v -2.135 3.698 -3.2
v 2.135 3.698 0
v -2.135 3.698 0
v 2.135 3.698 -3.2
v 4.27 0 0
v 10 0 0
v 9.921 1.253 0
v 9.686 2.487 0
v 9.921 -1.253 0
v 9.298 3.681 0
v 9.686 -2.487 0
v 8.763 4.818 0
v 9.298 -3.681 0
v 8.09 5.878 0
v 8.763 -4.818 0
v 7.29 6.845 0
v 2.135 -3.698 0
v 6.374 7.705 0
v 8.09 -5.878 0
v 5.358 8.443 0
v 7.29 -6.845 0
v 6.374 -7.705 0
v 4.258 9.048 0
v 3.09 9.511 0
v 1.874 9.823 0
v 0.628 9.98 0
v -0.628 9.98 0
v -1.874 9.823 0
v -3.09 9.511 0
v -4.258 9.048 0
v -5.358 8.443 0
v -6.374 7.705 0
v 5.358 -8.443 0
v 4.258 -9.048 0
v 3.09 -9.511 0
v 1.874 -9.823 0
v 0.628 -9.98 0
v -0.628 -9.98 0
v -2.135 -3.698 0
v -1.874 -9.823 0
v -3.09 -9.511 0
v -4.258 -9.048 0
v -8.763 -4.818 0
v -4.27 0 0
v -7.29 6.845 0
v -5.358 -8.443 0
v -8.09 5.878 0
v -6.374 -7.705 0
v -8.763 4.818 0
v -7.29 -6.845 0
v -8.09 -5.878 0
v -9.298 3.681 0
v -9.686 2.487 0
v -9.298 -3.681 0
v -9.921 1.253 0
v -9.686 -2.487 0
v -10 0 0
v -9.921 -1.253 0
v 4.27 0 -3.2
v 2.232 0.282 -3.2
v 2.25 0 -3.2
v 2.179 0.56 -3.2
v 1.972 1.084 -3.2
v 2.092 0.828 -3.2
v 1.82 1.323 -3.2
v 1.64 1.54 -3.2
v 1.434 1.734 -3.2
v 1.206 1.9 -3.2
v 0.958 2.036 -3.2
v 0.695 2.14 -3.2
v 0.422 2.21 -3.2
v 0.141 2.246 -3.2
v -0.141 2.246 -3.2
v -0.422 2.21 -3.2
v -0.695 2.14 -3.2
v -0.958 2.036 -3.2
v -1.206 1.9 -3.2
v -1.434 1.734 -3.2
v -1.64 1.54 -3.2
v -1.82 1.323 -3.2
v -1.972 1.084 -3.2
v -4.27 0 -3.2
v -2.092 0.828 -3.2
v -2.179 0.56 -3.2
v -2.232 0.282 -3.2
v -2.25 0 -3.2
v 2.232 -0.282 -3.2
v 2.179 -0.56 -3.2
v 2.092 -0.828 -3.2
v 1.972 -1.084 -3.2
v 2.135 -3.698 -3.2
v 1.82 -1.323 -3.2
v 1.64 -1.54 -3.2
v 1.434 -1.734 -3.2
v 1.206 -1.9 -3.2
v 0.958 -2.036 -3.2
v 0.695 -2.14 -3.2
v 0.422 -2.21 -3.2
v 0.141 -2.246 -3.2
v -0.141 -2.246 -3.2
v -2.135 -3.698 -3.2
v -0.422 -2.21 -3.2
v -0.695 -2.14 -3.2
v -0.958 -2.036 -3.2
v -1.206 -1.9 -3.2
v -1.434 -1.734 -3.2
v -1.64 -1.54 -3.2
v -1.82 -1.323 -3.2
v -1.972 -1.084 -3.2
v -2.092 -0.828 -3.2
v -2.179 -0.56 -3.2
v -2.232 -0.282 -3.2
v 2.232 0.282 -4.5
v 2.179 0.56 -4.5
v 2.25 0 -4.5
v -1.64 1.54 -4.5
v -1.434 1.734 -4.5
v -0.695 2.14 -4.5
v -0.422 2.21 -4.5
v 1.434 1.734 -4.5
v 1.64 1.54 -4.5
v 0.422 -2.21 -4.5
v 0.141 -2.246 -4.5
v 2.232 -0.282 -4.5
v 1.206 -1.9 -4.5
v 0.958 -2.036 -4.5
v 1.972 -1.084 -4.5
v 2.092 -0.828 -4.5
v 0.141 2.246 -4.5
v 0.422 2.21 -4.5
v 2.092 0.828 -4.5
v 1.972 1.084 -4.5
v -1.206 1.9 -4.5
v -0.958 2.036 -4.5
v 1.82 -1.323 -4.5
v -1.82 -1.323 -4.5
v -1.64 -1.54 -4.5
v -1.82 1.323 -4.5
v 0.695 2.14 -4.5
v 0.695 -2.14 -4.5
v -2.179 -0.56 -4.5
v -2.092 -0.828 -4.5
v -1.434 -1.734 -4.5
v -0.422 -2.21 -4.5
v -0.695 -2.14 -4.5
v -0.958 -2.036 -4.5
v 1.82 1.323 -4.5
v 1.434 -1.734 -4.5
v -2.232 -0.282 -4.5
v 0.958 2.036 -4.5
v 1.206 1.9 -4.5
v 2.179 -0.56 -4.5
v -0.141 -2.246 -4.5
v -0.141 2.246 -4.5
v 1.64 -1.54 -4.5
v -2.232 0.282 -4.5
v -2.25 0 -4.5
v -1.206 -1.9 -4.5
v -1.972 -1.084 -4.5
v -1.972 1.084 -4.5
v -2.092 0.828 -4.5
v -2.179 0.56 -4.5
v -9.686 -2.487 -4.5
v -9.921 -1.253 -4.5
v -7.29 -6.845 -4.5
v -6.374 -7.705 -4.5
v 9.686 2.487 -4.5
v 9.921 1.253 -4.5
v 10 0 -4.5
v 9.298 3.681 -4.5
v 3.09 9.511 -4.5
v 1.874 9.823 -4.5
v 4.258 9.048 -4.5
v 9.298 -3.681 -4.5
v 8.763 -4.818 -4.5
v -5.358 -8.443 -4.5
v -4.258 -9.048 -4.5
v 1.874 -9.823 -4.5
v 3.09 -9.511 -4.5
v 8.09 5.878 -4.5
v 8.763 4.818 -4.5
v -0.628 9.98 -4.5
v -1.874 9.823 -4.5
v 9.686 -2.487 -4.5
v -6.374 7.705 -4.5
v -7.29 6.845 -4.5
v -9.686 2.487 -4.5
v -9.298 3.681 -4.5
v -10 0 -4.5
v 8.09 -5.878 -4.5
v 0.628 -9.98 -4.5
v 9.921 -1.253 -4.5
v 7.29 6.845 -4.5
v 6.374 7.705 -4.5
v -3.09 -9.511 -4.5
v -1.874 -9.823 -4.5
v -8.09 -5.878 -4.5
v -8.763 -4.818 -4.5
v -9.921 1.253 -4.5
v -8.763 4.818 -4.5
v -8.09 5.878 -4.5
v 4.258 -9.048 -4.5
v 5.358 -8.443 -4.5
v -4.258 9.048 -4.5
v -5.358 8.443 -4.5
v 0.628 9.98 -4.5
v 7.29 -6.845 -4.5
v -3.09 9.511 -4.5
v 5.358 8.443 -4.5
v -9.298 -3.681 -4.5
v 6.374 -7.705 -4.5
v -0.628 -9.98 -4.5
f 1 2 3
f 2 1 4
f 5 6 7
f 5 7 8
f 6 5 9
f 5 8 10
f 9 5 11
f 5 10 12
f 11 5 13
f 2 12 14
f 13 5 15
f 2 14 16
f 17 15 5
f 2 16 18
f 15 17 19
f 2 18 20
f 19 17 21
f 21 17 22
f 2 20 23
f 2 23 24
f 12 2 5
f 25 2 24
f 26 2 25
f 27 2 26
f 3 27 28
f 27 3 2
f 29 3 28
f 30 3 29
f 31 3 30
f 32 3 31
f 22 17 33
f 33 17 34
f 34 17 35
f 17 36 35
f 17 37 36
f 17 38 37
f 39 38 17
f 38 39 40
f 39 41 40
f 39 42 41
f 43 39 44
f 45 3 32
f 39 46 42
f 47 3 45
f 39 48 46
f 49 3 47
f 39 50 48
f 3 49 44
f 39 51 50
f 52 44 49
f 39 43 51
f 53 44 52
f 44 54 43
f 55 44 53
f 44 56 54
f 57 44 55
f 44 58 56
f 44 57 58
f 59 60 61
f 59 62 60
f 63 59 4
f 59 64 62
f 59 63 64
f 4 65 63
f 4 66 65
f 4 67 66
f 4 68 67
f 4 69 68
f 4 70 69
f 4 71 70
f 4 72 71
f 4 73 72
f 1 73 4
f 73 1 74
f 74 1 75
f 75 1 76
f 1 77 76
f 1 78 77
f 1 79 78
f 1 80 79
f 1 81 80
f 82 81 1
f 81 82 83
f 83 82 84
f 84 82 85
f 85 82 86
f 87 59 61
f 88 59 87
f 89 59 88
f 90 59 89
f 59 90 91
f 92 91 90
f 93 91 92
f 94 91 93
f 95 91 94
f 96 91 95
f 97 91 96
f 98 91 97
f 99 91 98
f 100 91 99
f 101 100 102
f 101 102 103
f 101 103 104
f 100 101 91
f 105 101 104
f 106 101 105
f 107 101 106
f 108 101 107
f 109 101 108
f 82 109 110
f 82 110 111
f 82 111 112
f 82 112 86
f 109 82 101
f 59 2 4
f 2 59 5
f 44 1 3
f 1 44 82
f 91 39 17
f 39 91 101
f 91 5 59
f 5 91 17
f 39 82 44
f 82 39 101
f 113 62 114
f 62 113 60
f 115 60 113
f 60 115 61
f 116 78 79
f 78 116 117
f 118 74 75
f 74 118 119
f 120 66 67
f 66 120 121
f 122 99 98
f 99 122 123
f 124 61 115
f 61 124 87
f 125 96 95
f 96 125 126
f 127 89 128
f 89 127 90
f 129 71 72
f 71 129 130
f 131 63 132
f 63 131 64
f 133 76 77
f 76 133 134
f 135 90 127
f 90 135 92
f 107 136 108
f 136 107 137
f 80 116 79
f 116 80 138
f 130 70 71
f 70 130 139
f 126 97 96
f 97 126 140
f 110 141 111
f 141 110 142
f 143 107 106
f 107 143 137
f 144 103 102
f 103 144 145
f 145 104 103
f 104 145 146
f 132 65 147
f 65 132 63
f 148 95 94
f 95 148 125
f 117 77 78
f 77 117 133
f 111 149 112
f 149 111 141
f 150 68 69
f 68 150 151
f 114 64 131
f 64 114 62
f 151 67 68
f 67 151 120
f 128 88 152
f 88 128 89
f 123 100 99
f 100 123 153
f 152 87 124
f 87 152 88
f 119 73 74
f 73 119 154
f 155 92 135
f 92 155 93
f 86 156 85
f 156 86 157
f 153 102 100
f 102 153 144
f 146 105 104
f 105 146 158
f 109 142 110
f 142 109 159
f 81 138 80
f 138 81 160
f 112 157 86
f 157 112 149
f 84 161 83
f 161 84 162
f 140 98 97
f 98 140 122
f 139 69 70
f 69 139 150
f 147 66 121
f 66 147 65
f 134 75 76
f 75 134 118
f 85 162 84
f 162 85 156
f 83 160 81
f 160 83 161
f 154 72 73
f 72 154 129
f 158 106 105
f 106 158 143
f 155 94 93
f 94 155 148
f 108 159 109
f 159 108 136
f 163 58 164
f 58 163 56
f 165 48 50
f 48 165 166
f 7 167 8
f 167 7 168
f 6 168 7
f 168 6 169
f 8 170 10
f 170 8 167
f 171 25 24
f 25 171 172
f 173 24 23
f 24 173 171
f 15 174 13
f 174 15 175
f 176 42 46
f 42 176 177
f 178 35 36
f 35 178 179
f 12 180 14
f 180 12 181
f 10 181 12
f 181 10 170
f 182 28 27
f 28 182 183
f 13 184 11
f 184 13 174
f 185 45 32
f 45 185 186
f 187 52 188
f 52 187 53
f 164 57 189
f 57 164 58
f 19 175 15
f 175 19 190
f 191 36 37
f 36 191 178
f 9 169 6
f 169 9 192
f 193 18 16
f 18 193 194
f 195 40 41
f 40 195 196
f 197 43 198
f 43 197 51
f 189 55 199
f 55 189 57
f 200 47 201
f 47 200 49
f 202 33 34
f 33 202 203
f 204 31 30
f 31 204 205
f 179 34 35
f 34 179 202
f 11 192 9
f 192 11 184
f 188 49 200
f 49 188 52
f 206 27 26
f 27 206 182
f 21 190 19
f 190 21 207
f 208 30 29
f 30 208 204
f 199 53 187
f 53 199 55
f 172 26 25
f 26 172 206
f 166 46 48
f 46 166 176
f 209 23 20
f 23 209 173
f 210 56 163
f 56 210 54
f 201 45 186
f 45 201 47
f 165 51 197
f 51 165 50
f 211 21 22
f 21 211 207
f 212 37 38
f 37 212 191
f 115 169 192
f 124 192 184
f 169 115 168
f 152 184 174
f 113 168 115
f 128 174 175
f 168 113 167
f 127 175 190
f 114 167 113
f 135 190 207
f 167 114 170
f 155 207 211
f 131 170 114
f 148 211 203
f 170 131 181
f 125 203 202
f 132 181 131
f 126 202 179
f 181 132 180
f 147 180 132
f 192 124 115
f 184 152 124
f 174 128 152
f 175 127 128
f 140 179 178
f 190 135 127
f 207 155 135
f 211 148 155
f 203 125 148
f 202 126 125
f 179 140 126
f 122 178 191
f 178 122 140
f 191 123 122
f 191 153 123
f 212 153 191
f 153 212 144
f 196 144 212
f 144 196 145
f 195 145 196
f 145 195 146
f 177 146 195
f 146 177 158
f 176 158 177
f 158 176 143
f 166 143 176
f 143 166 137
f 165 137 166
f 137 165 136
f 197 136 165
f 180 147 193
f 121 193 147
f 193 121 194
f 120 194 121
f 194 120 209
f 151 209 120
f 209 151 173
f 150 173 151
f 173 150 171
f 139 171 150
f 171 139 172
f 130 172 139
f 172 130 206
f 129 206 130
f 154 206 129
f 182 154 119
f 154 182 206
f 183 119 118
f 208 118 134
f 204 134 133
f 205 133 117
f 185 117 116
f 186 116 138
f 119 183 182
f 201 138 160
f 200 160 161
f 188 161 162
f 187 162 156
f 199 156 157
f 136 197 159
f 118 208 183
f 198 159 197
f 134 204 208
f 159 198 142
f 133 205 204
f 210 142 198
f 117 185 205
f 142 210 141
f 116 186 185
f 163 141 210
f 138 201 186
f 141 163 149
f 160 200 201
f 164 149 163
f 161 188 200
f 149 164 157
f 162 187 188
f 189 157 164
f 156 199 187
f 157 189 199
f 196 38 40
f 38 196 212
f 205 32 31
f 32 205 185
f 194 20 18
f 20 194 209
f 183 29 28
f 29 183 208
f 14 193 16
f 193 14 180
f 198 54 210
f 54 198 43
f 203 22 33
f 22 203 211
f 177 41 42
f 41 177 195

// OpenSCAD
$fn = 50;


difference() {
	union() {
		translate(v = [0, 0, -4.5000000000]) {
			cylinder(h = 4.5000000000, r = 10.0000000000);
		}
	}
	union() {
		translate(v = [0, 0, 0]) {
			rotate(a = [0, 0, 0]) {
				difference() {
					union() {
						translate(v = [0, 0, -3.2000000000]) {
							linear_extrude(height = 3.2000000000) {
								polygon(points = [[4.2698000000, 0.0000000000], [2.1349000000, 3.6977552691], [-2.1349000000, 3.6977552691], [-4.2698000000, 0.0000000000], [-2.1349000000, -3.6977552691], [2.1349000000, -3.6977552691]]);
							}
						}
					}
					union();
				}
			}
		}
		#translate(v = [0, 0, -100.0000000000]) {
			cylinder(h = 200, r = 2.2500000000);
		}
	}
}
